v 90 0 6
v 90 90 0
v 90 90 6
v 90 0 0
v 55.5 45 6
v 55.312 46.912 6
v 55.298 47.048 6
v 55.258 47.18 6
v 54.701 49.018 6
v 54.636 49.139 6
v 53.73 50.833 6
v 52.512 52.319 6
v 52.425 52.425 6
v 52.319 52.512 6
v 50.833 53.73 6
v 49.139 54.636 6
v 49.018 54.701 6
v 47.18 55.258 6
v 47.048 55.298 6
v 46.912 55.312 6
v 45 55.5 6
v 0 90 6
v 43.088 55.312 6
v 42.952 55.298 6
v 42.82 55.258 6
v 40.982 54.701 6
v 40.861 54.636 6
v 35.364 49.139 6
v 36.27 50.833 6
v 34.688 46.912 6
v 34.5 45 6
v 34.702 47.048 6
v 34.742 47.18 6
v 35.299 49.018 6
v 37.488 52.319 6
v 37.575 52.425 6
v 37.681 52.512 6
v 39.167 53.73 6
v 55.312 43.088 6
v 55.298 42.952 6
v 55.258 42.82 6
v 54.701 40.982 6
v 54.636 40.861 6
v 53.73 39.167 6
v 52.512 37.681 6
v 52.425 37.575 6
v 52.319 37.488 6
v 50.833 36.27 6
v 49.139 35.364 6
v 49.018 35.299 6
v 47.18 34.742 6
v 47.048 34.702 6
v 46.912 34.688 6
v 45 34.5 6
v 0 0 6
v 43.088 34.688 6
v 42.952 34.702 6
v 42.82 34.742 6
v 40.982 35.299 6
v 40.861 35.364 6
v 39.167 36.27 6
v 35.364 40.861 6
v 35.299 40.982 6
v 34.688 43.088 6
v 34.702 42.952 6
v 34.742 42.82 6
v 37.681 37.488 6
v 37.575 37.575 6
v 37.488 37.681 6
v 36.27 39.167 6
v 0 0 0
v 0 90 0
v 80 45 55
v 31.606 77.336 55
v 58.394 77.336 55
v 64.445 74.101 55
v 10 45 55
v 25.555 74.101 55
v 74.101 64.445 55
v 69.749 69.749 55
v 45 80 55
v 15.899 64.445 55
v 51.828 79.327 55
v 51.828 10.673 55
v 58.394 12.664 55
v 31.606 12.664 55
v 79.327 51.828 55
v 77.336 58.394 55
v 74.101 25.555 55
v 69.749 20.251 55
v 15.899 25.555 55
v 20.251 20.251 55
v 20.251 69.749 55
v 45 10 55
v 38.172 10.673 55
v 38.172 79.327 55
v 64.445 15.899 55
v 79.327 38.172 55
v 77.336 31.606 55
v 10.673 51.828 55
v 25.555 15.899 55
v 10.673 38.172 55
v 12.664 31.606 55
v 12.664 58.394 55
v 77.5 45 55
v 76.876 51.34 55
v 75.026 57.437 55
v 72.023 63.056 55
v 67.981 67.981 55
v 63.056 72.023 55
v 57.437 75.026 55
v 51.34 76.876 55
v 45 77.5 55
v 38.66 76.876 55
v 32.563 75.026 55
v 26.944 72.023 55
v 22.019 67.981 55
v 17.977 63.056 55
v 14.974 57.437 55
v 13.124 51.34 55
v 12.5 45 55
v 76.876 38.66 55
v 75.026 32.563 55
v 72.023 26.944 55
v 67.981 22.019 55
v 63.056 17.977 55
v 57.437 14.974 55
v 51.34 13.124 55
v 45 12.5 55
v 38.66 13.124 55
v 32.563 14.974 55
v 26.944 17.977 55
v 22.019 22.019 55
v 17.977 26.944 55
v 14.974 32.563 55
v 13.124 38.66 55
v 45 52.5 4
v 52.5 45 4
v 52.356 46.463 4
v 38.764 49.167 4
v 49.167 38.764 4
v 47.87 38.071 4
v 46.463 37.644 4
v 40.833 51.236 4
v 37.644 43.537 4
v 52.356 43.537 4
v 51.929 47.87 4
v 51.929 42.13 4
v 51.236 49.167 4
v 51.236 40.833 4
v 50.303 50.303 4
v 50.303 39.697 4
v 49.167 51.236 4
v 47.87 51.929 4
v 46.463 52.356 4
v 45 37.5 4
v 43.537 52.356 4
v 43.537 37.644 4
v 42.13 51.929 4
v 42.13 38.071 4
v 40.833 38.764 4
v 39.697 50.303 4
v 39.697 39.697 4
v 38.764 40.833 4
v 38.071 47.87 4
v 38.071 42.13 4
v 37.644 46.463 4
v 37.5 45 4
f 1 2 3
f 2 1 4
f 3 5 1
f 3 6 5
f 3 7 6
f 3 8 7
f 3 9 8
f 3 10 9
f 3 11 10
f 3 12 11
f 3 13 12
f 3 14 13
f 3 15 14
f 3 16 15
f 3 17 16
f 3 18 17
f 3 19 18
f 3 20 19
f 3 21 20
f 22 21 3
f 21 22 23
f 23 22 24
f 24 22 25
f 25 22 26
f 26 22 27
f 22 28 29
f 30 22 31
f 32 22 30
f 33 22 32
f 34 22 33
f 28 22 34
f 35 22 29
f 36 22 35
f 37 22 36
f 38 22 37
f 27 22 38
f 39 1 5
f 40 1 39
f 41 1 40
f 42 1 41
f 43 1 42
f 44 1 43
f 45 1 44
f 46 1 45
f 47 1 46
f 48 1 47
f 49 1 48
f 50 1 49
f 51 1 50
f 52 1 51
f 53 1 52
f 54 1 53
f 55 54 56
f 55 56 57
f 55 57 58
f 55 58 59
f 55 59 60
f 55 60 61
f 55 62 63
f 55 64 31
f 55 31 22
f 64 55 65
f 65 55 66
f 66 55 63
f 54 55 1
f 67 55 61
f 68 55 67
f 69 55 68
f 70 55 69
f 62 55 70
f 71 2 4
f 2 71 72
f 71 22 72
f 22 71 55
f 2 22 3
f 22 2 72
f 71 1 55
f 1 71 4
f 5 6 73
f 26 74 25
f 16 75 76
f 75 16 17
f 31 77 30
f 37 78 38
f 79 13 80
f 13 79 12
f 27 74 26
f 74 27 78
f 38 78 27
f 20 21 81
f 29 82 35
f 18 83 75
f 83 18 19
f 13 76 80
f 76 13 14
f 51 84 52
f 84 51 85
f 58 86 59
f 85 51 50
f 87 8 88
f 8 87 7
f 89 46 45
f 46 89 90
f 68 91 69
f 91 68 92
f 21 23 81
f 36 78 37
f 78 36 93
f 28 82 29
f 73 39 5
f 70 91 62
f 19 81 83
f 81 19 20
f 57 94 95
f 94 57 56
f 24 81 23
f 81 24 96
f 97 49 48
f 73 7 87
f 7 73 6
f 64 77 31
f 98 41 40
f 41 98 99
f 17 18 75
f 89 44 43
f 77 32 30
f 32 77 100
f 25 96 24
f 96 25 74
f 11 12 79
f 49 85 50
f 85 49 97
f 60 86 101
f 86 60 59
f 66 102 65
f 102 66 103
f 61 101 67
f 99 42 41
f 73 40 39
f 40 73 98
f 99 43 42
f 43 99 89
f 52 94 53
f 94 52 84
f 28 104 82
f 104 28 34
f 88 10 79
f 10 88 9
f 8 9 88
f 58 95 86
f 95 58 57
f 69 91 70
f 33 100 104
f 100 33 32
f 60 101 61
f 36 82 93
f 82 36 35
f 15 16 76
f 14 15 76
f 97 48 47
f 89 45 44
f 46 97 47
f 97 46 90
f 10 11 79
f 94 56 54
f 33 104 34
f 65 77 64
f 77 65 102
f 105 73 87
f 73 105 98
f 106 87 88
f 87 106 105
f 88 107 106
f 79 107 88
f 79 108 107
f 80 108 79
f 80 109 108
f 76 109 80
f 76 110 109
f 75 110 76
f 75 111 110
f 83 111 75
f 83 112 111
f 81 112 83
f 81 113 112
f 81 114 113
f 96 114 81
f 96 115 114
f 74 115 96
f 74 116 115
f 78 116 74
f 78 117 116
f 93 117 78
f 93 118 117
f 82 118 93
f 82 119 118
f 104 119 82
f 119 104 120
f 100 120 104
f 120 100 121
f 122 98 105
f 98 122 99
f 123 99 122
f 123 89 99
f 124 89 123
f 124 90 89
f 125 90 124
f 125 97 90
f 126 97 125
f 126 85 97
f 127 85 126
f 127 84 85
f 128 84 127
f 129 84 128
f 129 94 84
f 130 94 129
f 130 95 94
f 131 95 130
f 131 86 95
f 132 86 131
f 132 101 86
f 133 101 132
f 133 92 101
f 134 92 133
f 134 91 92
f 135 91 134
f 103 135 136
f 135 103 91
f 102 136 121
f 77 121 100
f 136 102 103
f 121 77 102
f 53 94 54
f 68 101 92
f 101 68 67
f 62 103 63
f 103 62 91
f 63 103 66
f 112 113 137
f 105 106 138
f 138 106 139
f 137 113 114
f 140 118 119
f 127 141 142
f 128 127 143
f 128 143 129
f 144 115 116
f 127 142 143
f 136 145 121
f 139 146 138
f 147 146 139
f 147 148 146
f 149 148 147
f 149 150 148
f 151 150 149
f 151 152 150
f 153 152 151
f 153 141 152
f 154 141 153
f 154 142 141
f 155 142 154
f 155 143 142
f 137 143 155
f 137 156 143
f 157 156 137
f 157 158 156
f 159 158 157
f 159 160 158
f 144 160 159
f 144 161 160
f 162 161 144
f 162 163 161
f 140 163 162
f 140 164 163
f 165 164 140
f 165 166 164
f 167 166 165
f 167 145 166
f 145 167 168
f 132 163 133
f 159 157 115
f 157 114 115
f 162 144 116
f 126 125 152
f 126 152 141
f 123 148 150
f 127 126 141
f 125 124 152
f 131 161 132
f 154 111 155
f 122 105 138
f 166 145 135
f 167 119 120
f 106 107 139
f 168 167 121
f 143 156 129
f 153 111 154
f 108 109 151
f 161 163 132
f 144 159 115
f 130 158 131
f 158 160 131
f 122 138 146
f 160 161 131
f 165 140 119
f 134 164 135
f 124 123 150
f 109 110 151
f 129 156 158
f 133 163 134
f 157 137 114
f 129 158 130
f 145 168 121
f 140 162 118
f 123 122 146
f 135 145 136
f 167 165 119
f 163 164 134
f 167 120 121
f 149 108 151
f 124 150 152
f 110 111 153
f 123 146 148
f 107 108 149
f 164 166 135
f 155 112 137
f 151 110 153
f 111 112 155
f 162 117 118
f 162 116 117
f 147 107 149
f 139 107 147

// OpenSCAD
$fn = 32;

// ----------------------------------------------------------------------
// Hopper: funnel with square flange
// ----------------------------------------------------------------------

// --- parameters (mm) ---
fl = 90;                  // flange side, X and Y
fl_t = 6;                 // flange thickness
cone_h = 50;              // cone height above the flange
top_d = 70;               // cone mouth diameter
bot_d = 20;               // cone spout diameter
wall = 2.5;               // cone wall thickness

bore_d = bot_d - 2 * wall;  // spout bore diameter
total_h = fl_t + cone_h - 1;  // overall height

difference() {
  union() {
    cube([fl, fl, fl_t]);
    translate([fl / 2, fl / 2, fl_t - 1])
      cylinder(h = cone_h, d1 = bot_d, d2 = top_d);
  }
  translate([fl / 2, fl / 2, fl_t - 2])
    cylinder(h = cone_h + 1, d1 = bore_d, d2 = top_d - 2 * wall);
}
